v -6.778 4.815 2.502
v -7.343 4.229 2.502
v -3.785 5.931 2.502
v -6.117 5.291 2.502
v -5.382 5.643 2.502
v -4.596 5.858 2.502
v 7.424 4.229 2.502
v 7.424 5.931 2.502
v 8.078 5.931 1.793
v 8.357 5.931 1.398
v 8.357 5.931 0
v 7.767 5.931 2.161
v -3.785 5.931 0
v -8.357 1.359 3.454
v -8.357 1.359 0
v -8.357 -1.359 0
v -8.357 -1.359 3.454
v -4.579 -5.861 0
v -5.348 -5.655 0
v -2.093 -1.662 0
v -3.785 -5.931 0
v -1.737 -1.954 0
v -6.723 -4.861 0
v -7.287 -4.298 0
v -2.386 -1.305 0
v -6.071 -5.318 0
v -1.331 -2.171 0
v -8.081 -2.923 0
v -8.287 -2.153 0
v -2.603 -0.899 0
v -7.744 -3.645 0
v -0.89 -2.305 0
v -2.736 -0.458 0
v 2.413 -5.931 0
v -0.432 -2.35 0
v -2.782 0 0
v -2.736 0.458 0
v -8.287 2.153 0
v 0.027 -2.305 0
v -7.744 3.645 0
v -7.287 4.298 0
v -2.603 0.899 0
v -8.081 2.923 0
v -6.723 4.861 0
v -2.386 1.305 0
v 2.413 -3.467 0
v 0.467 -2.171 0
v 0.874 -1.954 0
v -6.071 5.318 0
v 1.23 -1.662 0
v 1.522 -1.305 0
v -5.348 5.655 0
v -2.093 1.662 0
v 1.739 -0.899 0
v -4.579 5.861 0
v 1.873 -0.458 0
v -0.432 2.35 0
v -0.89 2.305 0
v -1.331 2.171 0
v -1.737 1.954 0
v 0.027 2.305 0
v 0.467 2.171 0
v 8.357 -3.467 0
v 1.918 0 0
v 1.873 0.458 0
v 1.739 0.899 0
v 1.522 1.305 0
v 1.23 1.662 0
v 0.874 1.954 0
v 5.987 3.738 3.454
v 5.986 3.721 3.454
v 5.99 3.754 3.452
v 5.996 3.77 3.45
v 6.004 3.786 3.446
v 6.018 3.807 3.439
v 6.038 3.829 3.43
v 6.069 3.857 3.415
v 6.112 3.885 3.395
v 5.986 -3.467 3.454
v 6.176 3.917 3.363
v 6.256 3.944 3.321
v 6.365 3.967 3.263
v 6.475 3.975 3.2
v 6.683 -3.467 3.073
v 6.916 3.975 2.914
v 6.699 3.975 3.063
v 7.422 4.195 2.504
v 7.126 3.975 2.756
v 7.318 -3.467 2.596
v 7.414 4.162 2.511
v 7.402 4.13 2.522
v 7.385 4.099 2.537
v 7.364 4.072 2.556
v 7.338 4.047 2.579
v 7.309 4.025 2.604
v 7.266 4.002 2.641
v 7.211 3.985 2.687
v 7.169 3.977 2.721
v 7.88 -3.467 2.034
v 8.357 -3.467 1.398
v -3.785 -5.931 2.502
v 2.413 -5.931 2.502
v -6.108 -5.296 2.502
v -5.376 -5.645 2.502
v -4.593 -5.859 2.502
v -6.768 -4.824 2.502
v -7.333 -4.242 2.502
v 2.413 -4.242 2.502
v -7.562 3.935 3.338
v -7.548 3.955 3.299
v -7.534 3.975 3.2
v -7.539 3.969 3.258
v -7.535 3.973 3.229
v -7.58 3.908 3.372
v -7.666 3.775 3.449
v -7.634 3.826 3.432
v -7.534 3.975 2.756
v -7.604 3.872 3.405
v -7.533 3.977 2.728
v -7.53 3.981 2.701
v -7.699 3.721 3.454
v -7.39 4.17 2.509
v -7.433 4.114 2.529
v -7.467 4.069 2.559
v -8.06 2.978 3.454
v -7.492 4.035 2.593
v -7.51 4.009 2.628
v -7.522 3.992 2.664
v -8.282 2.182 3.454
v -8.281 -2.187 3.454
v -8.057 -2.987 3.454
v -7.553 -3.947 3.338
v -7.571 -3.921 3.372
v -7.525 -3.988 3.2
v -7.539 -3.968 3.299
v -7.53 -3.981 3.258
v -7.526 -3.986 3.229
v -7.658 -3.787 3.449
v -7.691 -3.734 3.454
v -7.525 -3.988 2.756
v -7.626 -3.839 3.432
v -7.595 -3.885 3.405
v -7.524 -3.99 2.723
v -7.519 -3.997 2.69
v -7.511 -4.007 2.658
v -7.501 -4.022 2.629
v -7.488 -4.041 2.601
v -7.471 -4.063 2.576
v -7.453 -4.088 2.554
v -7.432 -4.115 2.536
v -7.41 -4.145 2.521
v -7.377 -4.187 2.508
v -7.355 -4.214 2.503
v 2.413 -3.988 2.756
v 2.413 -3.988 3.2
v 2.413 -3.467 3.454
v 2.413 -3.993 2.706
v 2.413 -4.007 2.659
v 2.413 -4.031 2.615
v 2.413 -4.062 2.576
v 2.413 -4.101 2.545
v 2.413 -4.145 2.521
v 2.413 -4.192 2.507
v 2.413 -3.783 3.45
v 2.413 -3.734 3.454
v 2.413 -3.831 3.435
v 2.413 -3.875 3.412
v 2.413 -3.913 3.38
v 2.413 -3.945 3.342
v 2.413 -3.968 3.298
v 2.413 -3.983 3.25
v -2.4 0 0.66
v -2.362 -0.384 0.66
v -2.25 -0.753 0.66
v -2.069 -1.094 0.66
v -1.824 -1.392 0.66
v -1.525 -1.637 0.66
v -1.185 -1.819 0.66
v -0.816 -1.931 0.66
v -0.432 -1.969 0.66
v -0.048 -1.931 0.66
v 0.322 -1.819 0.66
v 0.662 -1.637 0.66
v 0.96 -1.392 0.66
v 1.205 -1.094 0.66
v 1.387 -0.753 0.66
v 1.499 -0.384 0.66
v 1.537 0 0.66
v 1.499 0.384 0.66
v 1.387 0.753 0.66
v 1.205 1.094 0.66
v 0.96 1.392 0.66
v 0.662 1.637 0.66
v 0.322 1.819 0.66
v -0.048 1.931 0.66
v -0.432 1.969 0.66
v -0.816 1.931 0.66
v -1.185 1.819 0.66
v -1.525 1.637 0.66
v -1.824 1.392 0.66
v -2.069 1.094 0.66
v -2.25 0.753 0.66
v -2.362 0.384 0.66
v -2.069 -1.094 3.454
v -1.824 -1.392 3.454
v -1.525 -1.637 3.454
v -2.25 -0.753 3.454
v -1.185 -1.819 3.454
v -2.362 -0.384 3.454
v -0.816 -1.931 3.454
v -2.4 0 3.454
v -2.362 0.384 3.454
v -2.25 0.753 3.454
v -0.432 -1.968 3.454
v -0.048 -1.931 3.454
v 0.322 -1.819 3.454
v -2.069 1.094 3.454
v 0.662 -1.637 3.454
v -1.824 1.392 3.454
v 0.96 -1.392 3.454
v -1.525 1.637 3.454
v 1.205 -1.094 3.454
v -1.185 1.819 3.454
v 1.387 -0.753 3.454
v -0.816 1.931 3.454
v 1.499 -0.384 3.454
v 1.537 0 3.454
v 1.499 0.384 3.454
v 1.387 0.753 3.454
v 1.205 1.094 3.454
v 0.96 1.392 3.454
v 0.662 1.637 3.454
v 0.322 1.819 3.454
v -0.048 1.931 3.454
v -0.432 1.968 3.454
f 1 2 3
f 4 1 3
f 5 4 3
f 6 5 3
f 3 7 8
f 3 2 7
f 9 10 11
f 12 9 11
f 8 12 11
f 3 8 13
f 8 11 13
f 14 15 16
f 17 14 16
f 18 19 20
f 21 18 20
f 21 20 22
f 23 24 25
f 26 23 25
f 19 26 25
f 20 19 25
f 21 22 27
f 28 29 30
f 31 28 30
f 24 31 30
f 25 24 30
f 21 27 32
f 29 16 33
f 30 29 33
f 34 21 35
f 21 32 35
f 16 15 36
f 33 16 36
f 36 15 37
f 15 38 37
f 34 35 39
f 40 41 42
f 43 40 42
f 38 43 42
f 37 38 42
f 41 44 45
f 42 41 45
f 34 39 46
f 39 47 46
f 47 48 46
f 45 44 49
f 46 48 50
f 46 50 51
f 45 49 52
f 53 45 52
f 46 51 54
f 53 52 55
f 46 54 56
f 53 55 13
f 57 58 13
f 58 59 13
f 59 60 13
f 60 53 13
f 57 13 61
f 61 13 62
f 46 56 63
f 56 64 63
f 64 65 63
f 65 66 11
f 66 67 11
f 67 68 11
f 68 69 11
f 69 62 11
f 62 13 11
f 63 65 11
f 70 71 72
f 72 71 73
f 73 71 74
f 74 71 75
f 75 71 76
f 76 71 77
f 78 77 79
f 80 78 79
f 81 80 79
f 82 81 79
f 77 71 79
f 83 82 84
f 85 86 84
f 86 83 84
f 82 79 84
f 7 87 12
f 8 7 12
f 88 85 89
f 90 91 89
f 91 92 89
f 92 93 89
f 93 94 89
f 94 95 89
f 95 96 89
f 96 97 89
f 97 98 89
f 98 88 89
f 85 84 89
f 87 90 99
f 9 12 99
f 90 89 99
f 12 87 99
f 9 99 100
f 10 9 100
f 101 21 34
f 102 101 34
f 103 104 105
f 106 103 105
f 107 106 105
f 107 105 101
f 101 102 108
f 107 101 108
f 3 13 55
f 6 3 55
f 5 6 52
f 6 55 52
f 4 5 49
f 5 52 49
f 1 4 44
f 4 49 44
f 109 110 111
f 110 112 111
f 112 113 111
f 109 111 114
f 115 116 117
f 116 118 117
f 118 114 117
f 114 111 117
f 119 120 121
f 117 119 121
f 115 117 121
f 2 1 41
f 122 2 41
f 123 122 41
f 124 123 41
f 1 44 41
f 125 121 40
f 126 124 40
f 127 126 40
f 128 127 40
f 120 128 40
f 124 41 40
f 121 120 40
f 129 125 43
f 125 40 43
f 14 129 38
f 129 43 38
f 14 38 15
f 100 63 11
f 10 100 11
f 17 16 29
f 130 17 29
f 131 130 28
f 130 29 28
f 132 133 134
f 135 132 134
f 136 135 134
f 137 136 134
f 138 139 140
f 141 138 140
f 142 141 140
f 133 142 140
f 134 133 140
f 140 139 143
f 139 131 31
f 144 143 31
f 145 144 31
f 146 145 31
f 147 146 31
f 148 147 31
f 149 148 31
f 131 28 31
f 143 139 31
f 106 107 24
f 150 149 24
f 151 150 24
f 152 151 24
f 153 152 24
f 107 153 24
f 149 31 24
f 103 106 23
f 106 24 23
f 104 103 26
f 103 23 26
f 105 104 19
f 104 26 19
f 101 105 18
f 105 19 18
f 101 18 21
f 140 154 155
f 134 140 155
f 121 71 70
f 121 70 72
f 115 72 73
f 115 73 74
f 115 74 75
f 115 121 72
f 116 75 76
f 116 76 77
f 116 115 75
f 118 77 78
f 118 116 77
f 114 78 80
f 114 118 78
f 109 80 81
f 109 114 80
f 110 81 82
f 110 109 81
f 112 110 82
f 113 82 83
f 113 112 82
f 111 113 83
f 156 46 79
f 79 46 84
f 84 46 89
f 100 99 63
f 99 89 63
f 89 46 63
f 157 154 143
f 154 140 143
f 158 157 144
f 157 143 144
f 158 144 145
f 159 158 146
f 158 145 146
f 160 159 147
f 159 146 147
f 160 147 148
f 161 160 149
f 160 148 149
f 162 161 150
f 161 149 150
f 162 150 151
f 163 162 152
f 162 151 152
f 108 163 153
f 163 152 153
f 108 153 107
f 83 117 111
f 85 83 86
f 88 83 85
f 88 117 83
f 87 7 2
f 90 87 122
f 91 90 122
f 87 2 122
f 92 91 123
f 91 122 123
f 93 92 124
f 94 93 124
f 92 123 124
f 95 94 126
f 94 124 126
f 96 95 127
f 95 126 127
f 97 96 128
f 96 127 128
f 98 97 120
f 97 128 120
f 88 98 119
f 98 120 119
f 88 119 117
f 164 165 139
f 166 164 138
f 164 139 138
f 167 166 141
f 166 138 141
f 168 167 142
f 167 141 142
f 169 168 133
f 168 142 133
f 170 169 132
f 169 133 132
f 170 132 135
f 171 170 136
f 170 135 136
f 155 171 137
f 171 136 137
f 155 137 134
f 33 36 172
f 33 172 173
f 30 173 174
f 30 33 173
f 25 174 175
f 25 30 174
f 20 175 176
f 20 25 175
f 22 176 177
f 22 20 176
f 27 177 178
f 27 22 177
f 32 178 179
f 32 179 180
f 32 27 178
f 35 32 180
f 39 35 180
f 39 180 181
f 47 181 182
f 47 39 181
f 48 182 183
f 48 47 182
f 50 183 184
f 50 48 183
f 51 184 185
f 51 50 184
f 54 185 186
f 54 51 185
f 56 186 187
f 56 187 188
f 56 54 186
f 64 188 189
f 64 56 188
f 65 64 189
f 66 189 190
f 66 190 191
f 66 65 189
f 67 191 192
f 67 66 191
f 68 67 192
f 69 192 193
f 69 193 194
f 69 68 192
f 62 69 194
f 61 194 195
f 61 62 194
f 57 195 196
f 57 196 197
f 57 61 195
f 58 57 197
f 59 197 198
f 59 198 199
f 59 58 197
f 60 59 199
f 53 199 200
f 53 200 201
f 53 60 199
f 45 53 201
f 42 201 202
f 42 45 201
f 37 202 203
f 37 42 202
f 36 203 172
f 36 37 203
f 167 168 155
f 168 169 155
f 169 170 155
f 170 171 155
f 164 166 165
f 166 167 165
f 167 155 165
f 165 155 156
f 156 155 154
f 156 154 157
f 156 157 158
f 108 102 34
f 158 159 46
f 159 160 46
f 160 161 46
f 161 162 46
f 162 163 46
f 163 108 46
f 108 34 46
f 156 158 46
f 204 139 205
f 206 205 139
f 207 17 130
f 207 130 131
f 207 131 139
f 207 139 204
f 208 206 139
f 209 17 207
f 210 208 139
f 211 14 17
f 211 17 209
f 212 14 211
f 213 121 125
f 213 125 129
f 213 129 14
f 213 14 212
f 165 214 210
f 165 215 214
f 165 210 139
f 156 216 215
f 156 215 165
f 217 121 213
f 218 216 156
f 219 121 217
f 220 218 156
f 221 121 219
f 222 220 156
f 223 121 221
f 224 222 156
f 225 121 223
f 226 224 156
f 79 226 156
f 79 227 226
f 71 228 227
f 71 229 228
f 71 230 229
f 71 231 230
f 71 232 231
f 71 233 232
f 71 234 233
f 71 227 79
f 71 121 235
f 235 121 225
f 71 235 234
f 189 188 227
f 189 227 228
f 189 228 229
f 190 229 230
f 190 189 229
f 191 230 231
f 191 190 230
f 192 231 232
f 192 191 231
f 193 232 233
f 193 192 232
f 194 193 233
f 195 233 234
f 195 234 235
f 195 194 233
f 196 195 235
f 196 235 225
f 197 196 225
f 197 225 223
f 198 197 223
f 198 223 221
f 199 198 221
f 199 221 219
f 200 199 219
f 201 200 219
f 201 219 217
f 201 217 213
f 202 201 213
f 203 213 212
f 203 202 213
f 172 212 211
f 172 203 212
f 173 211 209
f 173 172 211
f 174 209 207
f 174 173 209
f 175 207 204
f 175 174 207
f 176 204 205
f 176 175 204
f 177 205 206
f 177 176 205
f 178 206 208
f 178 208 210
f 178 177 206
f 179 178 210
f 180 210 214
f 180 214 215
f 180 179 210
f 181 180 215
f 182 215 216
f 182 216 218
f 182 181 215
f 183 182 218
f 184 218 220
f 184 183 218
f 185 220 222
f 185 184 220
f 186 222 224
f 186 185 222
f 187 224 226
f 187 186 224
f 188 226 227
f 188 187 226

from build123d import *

# Parameters (mm, degrees)
F0_R     = 1.9685
F1_DEPTH = 3.4544
F2_W     = 1.9558
F2_H     = 0.9525
F2_W_2   = 1.9431
F3_DEPTH = 16.7142
F5_DEPTH = 12.7
F6_R     = 0.254


with BuildPart() as f1:
    # F0 (on Top) → F1 (new body)
    with BuildSketch(Plane.XY):
        with BuildLine():
            Line((8.3566, 5.9309), (-3.7846, 5.9309))
            ThreePointArc((-3.7846, 5.9309), (-7.0174922036, 4.5917922036), (-8.3566, 1.3589))
            Line((-8.3566, 1.3589), (-8.3566, -1.3589))
            ThreePointArc((-8.3566, -1.3589), (-7.0174922036, -4.5917922036), (-3.7846, -5.9309))
            Line((-3.7846, -5.9309), (2.413, -5.9309))
            Line((2.413, -5.9309), (2.413, -3.4671))
            Line((2.413, -3.4671), (8.3566, -3.4671))
            Line((8.3566, -3.4671), (8.3566, 5.9309))
        make_face()
        with Locations((-0.4318, 0)):
            Circle(F0_R, mode=Mode.SUBTRACT)
    extrude(amount=F1_DEPTH)

    # F2 (on face) → F3 (cut, through all)
    with BuildSketch(Plane.YZ.offset(8.3566)):
        with Locations((4.953, 2.97815)):
            Rectangle(F2_W, F2_H)
        with Locations((-4.95935, 2.97815)):
            Rectangle(F2_W_2, F2_H)
    extrude(amount=-F3_DEPTH, mode=Mode.SUBTRACT)

    # F4 (on Front) → F5 (cut, symmetric)
    with BuildSketch(Plane.XZ):
        with BuildLine():
            Line((8.3566, 1.3984937485), (8.3566, 3.4544))
            Line((8.3566, 3.4544), (5.985548453, 3.4544))
            ThreePointArc((5.985548453, 3.4544), (7.3183634134, 2.596313693), (8.3566, 1.3984937485))
        make_face()
    extrude(amount=F5_DEPTH, both=True, mode=Mode.SUBTRACT)

    # F6
    f6_edges = [f1.edges().sort_by_distance(p)[0] for p in [
        (-2.556099, -3.9878, 3.4544),
        (-0.774271, 3.9751, 3.4544),
        (-2.556099, -3.9878, 2.5019),
        (-0.054799, 3.9751, 2.5019),
    ]]
    fillet(f6_edges, radius=F6_R)

    # F7 (on Front) → F8 (revolve, cut)
    with BuildSketch(Plane.XZ):
        Polygon((-2.4003, 0.6604), (-2.7815821178, 0), (-0.4318, 0), (-0.4318, 0.6604), align=None)
    revolve(axis=Axis((-0.4318, 0, 0.3302), (0, 0, 1)), mode=Mode.SUBTRACT)


solid = f1.part
